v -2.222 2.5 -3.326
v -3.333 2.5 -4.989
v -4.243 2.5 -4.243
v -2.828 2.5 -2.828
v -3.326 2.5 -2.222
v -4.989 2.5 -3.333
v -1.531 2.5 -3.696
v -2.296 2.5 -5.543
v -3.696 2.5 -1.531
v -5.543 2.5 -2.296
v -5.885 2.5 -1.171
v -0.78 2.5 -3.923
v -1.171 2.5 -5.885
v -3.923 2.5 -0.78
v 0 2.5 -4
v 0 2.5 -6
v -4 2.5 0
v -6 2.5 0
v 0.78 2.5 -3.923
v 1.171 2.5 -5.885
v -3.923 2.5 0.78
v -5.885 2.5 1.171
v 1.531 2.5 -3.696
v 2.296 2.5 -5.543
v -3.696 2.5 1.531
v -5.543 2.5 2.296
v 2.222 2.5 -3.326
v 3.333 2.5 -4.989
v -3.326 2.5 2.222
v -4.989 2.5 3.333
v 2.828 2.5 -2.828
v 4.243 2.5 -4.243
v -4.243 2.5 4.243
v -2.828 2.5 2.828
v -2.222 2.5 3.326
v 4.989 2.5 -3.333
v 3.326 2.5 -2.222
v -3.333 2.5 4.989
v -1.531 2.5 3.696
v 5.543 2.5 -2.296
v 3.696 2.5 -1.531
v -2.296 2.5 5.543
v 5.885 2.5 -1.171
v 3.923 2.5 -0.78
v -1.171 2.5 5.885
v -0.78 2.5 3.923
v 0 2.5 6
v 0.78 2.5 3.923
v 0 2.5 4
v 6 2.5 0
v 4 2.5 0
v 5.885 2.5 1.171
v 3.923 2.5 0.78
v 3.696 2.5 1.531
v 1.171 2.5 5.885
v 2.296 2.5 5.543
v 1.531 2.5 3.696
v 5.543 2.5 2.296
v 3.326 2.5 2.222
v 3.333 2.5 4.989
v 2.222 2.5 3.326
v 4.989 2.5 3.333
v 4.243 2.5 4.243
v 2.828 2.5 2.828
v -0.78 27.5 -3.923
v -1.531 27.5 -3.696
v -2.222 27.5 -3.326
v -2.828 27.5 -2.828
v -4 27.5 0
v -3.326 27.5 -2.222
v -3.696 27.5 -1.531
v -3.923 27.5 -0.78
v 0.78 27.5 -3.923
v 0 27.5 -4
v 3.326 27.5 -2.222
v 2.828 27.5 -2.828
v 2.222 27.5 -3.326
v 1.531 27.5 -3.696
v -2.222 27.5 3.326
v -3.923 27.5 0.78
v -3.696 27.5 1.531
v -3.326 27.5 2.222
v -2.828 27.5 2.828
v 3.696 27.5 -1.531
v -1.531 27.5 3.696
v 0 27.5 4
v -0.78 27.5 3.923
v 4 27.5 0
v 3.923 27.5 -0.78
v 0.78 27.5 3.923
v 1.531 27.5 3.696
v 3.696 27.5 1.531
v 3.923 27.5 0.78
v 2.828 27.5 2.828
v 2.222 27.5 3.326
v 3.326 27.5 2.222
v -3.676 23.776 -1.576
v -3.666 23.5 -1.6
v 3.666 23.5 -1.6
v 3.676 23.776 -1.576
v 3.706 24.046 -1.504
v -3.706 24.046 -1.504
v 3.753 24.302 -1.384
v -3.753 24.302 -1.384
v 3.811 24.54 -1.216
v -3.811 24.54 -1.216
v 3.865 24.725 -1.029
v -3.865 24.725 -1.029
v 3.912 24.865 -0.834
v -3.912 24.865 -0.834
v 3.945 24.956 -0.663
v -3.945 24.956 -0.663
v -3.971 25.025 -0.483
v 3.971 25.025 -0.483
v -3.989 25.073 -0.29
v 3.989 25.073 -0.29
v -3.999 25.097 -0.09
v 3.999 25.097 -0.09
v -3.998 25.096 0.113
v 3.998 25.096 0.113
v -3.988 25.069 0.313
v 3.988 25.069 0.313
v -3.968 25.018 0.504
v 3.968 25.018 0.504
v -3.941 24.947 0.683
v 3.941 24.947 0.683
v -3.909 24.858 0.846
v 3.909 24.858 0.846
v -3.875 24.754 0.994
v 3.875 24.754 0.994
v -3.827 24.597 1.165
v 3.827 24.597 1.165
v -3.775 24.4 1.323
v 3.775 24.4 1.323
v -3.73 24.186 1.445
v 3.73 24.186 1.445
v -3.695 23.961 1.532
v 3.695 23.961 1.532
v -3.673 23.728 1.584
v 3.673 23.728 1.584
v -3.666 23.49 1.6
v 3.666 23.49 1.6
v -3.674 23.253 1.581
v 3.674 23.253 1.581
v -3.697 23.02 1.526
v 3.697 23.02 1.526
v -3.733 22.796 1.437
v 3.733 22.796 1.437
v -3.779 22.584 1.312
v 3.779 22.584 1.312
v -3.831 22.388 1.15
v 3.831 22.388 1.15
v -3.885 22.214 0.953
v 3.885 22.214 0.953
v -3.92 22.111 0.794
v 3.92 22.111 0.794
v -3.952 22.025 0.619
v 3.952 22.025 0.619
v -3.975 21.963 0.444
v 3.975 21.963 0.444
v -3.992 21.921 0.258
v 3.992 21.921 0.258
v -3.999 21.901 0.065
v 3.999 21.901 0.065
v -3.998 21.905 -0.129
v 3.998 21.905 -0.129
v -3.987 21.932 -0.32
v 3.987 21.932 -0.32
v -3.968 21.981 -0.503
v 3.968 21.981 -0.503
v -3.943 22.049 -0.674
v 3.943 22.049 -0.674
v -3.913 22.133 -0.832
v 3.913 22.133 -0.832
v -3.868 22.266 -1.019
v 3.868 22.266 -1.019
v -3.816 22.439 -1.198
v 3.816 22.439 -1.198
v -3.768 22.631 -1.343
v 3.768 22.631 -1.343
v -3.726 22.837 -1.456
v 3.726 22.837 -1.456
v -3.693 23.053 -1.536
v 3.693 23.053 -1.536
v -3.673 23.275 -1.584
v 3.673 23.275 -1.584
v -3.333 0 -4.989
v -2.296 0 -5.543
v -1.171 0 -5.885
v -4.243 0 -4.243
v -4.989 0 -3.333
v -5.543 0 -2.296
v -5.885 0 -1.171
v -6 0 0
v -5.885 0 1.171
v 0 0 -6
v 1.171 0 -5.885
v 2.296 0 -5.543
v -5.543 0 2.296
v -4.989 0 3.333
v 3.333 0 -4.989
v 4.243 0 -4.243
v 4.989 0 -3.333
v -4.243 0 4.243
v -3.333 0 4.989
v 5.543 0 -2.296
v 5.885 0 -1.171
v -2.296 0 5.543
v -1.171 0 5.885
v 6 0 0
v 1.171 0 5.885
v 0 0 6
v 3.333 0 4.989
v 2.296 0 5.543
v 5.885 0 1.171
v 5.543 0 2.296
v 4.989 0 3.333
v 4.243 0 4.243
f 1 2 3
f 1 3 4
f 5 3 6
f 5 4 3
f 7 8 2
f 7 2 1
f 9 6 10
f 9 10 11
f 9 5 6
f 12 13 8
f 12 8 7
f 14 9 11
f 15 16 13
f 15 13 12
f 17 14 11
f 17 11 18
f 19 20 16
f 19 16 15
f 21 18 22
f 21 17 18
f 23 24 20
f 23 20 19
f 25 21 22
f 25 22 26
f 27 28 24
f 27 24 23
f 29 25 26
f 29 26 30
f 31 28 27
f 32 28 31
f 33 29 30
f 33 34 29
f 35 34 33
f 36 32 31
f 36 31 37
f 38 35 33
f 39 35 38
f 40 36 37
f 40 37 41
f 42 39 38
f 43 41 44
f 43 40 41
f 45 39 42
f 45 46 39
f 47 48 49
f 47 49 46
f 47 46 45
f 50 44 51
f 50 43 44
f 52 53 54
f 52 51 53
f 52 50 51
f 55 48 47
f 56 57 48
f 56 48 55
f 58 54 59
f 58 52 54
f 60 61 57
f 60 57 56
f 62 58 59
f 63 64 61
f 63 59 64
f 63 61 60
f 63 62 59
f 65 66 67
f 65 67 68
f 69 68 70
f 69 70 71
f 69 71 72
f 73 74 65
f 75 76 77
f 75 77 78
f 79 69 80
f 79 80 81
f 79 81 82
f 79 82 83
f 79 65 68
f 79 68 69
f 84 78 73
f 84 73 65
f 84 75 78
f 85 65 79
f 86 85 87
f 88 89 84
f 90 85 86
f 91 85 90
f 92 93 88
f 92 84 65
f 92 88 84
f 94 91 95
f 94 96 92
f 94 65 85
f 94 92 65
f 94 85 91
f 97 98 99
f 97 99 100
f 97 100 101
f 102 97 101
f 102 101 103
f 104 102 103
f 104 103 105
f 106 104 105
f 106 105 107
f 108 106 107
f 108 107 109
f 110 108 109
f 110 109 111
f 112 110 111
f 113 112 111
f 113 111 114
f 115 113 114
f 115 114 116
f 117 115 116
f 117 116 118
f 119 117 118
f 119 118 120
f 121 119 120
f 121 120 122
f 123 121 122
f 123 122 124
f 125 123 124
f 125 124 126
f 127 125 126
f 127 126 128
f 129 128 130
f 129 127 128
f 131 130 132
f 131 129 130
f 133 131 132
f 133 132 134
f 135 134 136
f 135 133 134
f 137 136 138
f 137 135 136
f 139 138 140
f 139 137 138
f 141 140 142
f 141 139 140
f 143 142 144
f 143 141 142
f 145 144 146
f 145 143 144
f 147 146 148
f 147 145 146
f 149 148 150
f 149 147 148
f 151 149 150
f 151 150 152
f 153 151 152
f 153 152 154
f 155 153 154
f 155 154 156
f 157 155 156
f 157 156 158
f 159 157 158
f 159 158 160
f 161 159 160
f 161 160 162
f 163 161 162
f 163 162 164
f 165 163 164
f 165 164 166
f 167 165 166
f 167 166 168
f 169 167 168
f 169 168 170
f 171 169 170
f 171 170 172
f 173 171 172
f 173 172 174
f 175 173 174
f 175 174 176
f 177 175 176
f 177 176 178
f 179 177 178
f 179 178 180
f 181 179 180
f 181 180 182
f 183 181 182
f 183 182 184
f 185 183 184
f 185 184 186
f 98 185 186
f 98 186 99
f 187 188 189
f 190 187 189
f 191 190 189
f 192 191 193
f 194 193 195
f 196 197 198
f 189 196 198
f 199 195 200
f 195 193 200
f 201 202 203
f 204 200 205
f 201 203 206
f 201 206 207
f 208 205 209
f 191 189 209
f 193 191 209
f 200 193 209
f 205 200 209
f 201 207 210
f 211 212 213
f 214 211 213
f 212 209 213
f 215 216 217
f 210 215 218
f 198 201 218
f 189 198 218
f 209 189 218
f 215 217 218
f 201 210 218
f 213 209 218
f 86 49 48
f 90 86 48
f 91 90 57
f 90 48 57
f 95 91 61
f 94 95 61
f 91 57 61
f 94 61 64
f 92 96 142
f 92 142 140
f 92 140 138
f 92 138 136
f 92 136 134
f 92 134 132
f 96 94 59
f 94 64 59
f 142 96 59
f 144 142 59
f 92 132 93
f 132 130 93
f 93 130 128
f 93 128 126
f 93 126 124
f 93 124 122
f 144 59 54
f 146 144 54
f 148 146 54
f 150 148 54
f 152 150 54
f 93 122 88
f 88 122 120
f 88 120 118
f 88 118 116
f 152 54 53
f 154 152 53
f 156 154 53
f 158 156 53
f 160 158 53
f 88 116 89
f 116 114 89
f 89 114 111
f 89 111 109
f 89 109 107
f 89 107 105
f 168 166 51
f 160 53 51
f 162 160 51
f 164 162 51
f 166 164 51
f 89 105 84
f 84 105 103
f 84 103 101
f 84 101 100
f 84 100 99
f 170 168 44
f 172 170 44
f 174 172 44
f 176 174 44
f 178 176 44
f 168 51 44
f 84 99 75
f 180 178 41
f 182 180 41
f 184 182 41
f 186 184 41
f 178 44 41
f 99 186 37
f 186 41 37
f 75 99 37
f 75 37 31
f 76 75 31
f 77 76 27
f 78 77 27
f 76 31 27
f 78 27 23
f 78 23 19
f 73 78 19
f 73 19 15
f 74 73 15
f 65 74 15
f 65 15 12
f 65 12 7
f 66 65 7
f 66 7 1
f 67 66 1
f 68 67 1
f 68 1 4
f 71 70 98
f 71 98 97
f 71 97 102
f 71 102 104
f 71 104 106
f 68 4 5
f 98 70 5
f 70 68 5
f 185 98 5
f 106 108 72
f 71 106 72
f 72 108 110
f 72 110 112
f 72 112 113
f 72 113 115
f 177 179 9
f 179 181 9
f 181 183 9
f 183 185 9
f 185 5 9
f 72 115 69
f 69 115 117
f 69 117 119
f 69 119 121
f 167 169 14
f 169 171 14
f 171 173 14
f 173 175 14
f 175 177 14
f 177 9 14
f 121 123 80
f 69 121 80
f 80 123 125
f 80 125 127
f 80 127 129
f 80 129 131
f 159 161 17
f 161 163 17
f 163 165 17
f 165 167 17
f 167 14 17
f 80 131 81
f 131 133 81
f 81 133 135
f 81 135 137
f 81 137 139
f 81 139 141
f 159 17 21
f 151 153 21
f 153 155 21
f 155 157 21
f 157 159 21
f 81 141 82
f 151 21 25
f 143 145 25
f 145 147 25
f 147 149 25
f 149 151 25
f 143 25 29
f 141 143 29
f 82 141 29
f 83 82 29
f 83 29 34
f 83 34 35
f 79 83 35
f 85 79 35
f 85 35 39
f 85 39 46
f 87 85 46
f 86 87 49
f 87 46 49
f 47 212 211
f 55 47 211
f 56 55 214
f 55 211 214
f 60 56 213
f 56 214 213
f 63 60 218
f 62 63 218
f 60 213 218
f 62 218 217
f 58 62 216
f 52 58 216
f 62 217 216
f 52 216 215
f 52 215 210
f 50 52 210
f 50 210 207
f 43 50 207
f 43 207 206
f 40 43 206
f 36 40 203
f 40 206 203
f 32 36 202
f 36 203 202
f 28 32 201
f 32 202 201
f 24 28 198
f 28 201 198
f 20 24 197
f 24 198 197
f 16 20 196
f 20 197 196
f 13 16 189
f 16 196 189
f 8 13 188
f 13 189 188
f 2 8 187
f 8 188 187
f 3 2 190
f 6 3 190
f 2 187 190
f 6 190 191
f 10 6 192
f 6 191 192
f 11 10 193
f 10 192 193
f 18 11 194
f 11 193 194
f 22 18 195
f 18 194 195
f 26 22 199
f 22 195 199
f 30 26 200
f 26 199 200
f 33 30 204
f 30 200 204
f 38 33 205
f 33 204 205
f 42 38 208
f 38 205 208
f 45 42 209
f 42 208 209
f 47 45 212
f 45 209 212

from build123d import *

# Parameters (mm, degrees)
SKETCH_1_R               = 6
EXTRUDE_1_DEPTH          = 2.5
SKETCH_2_R               = 4
EXTRUDE_2_DEPTH          = 25
CUT_EXTRUDE_1_DEPTH      = 29.779332862
CUT_EXTRUDE_1_DEPTH_BACK = 29.779332862
SKETCH_3_R               = 1.6


with BuildPart() as part:
    # 草图1 → 凸台-拉伸1 (new body)
    with BuildSketch(Plane(origin=(0, 0, 0), x_dir=(1, 0, 0), z_dir=(0, 1, 0))):
        with Locations(Location((0, 0, 0), (0, 0, 270))):
            Circle(SKETCH_1_R)
    extrude(amount=EXTRUDE_1_DEPTH)

    # 草图2 → 凸台-拉伸2 (add)
    with BuildSketch(Plane(origin=(0, 2.5, 0), x_dir=(1, 0, 0), z_dir=(0, 1, 0))):
        with Locations(Location((0, 0, 0), (0, 0, 270))):
            Circle(SKETCH_2_R)
    extrude(amount=EXTRUDE_2_DEPTH)

    # 草图3 → 切除-拉伸1 (cut, two sides: drawn at the far end of the back side and taken through both)
    with BuildSketch(Plane(origin=(0, 0, 0), x_dir=(0, 0, -1), z_dir=(1, 0, 0)).offset(-CUT_EXTRUDE_1_DEPTH_BACK)):
        with Locations((0, 23.5)):
            Circle(SKETCH_3_R)
    extrude(amount=CUT_EXTRUDE_1_DEPTH + CUT_EXTRUDE_1_DEPTH_BACK, mode=Mode.SUBTRACT)


solid = part.part
